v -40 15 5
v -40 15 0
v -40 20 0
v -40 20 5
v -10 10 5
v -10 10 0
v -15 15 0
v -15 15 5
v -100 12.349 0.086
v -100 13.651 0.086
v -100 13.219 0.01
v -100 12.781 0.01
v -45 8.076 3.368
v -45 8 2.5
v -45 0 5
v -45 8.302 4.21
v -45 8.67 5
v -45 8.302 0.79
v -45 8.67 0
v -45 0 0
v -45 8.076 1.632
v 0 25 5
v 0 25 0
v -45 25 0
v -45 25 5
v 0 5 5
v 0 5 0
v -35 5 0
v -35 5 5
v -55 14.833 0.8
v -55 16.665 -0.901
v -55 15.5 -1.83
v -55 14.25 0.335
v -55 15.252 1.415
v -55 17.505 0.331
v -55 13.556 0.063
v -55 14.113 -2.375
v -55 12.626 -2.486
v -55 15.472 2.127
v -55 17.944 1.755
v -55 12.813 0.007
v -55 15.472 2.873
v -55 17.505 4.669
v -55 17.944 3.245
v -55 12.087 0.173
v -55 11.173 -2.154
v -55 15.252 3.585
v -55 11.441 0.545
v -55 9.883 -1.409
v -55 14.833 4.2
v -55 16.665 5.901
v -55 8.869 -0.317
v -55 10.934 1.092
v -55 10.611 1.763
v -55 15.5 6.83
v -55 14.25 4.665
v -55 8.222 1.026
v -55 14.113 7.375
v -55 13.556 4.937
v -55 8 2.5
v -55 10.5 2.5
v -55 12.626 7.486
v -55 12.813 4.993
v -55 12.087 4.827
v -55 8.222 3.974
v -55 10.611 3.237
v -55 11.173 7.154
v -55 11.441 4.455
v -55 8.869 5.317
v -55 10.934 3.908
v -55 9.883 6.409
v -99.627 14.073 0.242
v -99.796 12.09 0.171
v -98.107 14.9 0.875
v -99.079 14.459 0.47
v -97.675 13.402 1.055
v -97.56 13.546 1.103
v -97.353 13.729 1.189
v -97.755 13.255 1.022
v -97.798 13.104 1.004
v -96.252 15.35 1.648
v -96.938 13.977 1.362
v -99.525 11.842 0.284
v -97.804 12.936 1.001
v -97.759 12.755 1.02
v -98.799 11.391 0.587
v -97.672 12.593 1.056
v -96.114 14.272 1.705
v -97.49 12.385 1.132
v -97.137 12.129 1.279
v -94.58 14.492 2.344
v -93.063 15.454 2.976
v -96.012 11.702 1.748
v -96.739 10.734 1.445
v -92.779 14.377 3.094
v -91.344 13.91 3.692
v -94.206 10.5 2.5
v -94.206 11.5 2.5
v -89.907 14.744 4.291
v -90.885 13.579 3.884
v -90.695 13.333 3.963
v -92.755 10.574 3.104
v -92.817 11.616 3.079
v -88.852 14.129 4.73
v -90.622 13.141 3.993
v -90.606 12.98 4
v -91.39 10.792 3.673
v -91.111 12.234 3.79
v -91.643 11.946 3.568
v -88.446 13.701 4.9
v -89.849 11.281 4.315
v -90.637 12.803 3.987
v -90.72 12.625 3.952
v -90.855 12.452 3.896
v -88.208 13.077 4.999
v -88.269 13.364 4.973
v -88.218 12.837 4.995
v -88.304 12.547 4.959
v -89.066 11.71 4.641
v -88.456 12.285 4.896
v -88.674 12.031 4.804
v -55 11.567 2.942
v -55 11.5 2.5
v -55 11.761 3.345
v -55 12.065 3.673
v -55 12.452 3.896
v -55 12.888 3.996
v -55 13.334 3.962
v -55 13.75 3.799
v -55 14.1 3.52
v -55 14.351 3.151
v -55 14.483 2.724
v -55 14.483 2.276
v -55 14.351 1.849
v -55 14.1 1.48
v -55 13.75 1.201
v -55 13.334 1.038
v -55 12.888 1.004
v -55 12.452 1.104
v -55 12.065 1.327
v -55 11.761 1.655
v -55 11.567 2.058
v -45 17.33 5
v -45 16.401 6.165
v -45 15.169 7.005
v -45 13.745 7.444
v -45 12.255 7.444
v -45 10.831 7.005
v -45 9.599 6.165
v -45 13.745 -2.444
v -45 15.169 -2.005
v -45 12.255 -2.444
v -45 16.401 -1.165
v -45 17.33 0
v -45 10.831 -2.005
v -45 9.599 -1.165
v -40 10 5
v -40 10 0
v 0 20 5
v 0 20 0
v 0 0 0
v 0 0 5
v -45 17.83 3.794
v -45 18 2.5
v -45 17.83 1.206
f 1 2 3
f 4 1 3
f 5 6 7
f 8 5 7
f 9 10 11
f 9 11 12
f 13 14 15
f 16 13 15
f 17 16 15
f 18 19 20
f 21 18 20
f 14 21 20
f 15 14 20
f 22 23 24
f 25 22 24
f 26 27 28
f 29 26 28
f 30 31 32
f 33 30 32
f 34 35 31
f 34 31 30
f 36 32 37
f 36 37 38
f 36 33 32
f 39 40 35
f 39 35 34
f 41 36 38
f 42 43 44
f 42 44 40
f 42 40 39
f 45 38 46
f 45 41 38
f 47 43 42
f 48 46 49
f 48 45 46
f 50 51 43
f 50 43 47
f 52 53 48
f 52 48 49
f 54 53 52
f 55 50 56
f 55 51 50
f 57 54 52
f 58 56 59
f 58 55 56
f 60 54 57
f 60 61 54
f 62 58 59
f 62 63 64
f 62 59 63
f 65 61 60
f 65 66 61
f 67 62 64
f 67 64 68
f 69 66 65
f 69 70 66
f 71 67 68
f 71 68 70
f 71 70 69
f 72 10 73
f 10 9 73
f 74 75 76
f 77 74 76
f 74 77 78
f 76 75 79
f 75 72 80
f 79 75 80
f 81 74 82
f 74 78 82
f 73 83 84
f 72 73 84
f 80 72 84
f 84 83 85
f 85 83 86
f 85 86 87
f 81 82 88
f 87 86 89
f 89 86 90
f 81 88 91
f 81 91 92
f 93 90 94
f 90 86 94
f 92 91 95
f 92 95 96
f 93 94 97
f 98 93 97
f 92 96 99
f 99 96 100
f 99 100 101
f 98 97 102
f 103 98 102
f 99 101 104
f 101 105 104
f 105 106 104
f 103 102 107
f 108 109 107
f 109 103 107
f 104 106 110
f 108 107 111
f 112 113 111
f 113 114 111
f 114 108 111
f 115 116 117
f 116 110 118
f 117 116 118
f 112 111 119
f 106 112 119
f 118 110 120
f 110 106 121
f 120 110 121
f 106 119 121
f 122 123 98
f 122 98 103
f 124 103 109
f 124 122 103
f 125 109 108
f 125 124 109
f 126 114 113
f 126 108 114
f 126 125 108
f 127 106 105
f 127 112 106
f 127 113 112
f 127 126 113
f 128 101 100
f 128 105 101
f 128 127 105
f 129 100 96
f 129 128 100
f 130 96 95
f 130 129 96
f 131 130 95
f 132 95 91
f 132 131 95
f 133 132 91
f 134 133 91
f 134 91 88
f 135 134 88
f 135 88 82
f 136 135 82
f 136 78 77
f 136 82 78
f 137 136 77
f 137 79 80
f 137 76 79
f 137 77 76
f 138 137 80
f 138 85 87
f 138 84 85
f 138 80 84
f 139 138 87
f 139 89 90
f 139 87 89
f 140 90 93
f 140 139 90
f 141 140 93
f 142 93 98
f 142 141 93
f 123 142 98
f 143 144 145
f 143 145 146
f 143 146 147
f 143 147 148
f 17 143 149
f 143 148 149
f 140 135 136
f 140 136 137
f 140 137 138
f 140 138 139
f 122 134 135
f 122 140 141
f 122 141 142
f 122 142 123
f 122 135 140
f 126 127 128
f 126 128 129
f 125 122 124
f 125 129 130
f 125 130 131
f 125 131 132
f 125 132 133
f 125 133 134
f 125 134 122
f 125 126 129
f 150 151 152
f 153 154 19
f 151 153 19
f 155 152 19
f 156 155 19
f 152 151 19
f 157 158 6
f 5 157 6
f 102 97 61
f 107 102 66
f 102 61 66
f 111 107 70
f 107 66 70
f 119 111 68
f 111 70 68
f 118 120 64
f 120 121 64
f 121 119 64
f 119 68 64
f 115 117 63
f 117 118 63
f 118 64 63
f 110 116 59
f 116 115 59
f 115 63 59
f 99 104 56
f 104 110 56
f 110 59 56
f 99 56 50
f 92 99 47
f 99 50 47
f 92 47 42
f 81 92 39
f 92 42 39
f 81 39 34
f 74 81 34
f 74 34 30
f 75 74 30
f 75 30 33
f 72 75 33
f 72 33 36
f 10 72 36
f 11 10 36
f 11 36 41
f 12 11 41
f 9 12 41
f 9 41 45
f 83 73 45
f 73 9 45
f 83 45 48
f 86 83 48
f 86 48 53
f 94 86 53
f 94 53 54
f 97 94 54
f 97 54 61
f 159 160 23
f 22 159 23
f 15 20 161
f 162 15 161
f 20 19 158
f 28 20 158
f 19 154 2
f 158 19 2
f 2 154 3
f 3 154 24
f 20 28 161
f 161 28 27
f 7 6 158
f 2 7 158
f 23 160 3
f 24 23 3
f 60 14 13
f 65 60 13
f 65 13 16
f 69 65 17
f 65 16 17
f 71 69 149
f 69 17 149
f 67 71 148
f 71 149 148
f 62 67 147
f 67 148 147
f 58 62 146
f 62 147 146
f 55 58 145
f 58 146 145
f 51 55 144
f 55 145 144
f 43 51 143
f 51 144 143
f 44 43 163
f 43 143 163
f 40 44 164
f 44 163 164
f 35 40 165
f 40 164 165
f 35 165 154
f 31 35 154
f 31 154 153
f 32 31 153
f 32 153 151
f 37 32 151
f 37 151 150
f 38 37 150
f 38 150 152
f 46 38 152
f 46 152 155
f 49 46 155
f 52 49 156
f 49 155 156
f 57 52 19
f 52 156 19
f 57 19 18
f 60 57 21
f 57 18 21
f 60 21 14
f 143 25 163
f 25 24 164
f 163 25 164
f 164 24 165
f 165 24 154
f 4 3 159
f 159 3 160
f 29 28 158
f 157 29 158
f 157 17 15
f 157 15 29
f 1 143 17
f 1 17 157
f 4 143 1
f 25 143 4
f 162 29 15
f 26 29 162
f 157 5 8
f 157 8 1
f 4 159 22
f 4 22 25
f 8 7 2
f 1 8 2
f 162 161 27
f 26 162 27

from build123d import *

# Parameters (mm, degrees)
F1_DEPTH = 5
F2_R     = 5
F3_DEPTH = 10
F4_R     = 2.5
F4_R_2   = 1.5
F5_DEPTH = 45
F7_DEPTH = 25


with BuildPart() as f1:
    # F0 (on Top) → F1 (new body)
    with BuildSketch(Plane.XY):
        Polygon((-45, 0), (0, 0), (0, 5), (-35, 5), (-40, 10), (-10, 10), (-15, 15), (-40, 15), (-40, 20), (0, 20), (0, 25), (-45, 25), align=None)
    extrude(amount=F1_DEPTH)

    # F2 (on face) → F3 (join)
    with BuildSketch(Plane(origin=(-45, 0, 0), x_dir=(0, -1, 0), z_dir=(-1, 0, 0))):
        with Locations((-13, 2.5)):
            Circle(F2_R)
    extrude(amount=F3_DEPTH)

    # F4 (on face) → F5 (join)
    with BuildSketch(Plane(origin=(-55, 0, 0), x_dir=(0, -1, 0), z_dir=(-1, 0, 0))):
        with Locations((-13, 2.5)):
            Circle(F4_R)
        with Locations((-13, 2.5)):
            Circle(F4_R_2, mode=Mode.SUBTRACT)
    extrude(amount=F5_DEPTH)

    # F6 (on face) → F7 (cut)
    with BuildSketch(Plane.XZ):
        Polygon((-100.207202, 5.022824), (-100.207202, 0), (-88.150322, 5.022824), align=None)
    extrude(amount=-F7_DEPTH, mode=Mode.SUBTRACT)


solid = f1.part
